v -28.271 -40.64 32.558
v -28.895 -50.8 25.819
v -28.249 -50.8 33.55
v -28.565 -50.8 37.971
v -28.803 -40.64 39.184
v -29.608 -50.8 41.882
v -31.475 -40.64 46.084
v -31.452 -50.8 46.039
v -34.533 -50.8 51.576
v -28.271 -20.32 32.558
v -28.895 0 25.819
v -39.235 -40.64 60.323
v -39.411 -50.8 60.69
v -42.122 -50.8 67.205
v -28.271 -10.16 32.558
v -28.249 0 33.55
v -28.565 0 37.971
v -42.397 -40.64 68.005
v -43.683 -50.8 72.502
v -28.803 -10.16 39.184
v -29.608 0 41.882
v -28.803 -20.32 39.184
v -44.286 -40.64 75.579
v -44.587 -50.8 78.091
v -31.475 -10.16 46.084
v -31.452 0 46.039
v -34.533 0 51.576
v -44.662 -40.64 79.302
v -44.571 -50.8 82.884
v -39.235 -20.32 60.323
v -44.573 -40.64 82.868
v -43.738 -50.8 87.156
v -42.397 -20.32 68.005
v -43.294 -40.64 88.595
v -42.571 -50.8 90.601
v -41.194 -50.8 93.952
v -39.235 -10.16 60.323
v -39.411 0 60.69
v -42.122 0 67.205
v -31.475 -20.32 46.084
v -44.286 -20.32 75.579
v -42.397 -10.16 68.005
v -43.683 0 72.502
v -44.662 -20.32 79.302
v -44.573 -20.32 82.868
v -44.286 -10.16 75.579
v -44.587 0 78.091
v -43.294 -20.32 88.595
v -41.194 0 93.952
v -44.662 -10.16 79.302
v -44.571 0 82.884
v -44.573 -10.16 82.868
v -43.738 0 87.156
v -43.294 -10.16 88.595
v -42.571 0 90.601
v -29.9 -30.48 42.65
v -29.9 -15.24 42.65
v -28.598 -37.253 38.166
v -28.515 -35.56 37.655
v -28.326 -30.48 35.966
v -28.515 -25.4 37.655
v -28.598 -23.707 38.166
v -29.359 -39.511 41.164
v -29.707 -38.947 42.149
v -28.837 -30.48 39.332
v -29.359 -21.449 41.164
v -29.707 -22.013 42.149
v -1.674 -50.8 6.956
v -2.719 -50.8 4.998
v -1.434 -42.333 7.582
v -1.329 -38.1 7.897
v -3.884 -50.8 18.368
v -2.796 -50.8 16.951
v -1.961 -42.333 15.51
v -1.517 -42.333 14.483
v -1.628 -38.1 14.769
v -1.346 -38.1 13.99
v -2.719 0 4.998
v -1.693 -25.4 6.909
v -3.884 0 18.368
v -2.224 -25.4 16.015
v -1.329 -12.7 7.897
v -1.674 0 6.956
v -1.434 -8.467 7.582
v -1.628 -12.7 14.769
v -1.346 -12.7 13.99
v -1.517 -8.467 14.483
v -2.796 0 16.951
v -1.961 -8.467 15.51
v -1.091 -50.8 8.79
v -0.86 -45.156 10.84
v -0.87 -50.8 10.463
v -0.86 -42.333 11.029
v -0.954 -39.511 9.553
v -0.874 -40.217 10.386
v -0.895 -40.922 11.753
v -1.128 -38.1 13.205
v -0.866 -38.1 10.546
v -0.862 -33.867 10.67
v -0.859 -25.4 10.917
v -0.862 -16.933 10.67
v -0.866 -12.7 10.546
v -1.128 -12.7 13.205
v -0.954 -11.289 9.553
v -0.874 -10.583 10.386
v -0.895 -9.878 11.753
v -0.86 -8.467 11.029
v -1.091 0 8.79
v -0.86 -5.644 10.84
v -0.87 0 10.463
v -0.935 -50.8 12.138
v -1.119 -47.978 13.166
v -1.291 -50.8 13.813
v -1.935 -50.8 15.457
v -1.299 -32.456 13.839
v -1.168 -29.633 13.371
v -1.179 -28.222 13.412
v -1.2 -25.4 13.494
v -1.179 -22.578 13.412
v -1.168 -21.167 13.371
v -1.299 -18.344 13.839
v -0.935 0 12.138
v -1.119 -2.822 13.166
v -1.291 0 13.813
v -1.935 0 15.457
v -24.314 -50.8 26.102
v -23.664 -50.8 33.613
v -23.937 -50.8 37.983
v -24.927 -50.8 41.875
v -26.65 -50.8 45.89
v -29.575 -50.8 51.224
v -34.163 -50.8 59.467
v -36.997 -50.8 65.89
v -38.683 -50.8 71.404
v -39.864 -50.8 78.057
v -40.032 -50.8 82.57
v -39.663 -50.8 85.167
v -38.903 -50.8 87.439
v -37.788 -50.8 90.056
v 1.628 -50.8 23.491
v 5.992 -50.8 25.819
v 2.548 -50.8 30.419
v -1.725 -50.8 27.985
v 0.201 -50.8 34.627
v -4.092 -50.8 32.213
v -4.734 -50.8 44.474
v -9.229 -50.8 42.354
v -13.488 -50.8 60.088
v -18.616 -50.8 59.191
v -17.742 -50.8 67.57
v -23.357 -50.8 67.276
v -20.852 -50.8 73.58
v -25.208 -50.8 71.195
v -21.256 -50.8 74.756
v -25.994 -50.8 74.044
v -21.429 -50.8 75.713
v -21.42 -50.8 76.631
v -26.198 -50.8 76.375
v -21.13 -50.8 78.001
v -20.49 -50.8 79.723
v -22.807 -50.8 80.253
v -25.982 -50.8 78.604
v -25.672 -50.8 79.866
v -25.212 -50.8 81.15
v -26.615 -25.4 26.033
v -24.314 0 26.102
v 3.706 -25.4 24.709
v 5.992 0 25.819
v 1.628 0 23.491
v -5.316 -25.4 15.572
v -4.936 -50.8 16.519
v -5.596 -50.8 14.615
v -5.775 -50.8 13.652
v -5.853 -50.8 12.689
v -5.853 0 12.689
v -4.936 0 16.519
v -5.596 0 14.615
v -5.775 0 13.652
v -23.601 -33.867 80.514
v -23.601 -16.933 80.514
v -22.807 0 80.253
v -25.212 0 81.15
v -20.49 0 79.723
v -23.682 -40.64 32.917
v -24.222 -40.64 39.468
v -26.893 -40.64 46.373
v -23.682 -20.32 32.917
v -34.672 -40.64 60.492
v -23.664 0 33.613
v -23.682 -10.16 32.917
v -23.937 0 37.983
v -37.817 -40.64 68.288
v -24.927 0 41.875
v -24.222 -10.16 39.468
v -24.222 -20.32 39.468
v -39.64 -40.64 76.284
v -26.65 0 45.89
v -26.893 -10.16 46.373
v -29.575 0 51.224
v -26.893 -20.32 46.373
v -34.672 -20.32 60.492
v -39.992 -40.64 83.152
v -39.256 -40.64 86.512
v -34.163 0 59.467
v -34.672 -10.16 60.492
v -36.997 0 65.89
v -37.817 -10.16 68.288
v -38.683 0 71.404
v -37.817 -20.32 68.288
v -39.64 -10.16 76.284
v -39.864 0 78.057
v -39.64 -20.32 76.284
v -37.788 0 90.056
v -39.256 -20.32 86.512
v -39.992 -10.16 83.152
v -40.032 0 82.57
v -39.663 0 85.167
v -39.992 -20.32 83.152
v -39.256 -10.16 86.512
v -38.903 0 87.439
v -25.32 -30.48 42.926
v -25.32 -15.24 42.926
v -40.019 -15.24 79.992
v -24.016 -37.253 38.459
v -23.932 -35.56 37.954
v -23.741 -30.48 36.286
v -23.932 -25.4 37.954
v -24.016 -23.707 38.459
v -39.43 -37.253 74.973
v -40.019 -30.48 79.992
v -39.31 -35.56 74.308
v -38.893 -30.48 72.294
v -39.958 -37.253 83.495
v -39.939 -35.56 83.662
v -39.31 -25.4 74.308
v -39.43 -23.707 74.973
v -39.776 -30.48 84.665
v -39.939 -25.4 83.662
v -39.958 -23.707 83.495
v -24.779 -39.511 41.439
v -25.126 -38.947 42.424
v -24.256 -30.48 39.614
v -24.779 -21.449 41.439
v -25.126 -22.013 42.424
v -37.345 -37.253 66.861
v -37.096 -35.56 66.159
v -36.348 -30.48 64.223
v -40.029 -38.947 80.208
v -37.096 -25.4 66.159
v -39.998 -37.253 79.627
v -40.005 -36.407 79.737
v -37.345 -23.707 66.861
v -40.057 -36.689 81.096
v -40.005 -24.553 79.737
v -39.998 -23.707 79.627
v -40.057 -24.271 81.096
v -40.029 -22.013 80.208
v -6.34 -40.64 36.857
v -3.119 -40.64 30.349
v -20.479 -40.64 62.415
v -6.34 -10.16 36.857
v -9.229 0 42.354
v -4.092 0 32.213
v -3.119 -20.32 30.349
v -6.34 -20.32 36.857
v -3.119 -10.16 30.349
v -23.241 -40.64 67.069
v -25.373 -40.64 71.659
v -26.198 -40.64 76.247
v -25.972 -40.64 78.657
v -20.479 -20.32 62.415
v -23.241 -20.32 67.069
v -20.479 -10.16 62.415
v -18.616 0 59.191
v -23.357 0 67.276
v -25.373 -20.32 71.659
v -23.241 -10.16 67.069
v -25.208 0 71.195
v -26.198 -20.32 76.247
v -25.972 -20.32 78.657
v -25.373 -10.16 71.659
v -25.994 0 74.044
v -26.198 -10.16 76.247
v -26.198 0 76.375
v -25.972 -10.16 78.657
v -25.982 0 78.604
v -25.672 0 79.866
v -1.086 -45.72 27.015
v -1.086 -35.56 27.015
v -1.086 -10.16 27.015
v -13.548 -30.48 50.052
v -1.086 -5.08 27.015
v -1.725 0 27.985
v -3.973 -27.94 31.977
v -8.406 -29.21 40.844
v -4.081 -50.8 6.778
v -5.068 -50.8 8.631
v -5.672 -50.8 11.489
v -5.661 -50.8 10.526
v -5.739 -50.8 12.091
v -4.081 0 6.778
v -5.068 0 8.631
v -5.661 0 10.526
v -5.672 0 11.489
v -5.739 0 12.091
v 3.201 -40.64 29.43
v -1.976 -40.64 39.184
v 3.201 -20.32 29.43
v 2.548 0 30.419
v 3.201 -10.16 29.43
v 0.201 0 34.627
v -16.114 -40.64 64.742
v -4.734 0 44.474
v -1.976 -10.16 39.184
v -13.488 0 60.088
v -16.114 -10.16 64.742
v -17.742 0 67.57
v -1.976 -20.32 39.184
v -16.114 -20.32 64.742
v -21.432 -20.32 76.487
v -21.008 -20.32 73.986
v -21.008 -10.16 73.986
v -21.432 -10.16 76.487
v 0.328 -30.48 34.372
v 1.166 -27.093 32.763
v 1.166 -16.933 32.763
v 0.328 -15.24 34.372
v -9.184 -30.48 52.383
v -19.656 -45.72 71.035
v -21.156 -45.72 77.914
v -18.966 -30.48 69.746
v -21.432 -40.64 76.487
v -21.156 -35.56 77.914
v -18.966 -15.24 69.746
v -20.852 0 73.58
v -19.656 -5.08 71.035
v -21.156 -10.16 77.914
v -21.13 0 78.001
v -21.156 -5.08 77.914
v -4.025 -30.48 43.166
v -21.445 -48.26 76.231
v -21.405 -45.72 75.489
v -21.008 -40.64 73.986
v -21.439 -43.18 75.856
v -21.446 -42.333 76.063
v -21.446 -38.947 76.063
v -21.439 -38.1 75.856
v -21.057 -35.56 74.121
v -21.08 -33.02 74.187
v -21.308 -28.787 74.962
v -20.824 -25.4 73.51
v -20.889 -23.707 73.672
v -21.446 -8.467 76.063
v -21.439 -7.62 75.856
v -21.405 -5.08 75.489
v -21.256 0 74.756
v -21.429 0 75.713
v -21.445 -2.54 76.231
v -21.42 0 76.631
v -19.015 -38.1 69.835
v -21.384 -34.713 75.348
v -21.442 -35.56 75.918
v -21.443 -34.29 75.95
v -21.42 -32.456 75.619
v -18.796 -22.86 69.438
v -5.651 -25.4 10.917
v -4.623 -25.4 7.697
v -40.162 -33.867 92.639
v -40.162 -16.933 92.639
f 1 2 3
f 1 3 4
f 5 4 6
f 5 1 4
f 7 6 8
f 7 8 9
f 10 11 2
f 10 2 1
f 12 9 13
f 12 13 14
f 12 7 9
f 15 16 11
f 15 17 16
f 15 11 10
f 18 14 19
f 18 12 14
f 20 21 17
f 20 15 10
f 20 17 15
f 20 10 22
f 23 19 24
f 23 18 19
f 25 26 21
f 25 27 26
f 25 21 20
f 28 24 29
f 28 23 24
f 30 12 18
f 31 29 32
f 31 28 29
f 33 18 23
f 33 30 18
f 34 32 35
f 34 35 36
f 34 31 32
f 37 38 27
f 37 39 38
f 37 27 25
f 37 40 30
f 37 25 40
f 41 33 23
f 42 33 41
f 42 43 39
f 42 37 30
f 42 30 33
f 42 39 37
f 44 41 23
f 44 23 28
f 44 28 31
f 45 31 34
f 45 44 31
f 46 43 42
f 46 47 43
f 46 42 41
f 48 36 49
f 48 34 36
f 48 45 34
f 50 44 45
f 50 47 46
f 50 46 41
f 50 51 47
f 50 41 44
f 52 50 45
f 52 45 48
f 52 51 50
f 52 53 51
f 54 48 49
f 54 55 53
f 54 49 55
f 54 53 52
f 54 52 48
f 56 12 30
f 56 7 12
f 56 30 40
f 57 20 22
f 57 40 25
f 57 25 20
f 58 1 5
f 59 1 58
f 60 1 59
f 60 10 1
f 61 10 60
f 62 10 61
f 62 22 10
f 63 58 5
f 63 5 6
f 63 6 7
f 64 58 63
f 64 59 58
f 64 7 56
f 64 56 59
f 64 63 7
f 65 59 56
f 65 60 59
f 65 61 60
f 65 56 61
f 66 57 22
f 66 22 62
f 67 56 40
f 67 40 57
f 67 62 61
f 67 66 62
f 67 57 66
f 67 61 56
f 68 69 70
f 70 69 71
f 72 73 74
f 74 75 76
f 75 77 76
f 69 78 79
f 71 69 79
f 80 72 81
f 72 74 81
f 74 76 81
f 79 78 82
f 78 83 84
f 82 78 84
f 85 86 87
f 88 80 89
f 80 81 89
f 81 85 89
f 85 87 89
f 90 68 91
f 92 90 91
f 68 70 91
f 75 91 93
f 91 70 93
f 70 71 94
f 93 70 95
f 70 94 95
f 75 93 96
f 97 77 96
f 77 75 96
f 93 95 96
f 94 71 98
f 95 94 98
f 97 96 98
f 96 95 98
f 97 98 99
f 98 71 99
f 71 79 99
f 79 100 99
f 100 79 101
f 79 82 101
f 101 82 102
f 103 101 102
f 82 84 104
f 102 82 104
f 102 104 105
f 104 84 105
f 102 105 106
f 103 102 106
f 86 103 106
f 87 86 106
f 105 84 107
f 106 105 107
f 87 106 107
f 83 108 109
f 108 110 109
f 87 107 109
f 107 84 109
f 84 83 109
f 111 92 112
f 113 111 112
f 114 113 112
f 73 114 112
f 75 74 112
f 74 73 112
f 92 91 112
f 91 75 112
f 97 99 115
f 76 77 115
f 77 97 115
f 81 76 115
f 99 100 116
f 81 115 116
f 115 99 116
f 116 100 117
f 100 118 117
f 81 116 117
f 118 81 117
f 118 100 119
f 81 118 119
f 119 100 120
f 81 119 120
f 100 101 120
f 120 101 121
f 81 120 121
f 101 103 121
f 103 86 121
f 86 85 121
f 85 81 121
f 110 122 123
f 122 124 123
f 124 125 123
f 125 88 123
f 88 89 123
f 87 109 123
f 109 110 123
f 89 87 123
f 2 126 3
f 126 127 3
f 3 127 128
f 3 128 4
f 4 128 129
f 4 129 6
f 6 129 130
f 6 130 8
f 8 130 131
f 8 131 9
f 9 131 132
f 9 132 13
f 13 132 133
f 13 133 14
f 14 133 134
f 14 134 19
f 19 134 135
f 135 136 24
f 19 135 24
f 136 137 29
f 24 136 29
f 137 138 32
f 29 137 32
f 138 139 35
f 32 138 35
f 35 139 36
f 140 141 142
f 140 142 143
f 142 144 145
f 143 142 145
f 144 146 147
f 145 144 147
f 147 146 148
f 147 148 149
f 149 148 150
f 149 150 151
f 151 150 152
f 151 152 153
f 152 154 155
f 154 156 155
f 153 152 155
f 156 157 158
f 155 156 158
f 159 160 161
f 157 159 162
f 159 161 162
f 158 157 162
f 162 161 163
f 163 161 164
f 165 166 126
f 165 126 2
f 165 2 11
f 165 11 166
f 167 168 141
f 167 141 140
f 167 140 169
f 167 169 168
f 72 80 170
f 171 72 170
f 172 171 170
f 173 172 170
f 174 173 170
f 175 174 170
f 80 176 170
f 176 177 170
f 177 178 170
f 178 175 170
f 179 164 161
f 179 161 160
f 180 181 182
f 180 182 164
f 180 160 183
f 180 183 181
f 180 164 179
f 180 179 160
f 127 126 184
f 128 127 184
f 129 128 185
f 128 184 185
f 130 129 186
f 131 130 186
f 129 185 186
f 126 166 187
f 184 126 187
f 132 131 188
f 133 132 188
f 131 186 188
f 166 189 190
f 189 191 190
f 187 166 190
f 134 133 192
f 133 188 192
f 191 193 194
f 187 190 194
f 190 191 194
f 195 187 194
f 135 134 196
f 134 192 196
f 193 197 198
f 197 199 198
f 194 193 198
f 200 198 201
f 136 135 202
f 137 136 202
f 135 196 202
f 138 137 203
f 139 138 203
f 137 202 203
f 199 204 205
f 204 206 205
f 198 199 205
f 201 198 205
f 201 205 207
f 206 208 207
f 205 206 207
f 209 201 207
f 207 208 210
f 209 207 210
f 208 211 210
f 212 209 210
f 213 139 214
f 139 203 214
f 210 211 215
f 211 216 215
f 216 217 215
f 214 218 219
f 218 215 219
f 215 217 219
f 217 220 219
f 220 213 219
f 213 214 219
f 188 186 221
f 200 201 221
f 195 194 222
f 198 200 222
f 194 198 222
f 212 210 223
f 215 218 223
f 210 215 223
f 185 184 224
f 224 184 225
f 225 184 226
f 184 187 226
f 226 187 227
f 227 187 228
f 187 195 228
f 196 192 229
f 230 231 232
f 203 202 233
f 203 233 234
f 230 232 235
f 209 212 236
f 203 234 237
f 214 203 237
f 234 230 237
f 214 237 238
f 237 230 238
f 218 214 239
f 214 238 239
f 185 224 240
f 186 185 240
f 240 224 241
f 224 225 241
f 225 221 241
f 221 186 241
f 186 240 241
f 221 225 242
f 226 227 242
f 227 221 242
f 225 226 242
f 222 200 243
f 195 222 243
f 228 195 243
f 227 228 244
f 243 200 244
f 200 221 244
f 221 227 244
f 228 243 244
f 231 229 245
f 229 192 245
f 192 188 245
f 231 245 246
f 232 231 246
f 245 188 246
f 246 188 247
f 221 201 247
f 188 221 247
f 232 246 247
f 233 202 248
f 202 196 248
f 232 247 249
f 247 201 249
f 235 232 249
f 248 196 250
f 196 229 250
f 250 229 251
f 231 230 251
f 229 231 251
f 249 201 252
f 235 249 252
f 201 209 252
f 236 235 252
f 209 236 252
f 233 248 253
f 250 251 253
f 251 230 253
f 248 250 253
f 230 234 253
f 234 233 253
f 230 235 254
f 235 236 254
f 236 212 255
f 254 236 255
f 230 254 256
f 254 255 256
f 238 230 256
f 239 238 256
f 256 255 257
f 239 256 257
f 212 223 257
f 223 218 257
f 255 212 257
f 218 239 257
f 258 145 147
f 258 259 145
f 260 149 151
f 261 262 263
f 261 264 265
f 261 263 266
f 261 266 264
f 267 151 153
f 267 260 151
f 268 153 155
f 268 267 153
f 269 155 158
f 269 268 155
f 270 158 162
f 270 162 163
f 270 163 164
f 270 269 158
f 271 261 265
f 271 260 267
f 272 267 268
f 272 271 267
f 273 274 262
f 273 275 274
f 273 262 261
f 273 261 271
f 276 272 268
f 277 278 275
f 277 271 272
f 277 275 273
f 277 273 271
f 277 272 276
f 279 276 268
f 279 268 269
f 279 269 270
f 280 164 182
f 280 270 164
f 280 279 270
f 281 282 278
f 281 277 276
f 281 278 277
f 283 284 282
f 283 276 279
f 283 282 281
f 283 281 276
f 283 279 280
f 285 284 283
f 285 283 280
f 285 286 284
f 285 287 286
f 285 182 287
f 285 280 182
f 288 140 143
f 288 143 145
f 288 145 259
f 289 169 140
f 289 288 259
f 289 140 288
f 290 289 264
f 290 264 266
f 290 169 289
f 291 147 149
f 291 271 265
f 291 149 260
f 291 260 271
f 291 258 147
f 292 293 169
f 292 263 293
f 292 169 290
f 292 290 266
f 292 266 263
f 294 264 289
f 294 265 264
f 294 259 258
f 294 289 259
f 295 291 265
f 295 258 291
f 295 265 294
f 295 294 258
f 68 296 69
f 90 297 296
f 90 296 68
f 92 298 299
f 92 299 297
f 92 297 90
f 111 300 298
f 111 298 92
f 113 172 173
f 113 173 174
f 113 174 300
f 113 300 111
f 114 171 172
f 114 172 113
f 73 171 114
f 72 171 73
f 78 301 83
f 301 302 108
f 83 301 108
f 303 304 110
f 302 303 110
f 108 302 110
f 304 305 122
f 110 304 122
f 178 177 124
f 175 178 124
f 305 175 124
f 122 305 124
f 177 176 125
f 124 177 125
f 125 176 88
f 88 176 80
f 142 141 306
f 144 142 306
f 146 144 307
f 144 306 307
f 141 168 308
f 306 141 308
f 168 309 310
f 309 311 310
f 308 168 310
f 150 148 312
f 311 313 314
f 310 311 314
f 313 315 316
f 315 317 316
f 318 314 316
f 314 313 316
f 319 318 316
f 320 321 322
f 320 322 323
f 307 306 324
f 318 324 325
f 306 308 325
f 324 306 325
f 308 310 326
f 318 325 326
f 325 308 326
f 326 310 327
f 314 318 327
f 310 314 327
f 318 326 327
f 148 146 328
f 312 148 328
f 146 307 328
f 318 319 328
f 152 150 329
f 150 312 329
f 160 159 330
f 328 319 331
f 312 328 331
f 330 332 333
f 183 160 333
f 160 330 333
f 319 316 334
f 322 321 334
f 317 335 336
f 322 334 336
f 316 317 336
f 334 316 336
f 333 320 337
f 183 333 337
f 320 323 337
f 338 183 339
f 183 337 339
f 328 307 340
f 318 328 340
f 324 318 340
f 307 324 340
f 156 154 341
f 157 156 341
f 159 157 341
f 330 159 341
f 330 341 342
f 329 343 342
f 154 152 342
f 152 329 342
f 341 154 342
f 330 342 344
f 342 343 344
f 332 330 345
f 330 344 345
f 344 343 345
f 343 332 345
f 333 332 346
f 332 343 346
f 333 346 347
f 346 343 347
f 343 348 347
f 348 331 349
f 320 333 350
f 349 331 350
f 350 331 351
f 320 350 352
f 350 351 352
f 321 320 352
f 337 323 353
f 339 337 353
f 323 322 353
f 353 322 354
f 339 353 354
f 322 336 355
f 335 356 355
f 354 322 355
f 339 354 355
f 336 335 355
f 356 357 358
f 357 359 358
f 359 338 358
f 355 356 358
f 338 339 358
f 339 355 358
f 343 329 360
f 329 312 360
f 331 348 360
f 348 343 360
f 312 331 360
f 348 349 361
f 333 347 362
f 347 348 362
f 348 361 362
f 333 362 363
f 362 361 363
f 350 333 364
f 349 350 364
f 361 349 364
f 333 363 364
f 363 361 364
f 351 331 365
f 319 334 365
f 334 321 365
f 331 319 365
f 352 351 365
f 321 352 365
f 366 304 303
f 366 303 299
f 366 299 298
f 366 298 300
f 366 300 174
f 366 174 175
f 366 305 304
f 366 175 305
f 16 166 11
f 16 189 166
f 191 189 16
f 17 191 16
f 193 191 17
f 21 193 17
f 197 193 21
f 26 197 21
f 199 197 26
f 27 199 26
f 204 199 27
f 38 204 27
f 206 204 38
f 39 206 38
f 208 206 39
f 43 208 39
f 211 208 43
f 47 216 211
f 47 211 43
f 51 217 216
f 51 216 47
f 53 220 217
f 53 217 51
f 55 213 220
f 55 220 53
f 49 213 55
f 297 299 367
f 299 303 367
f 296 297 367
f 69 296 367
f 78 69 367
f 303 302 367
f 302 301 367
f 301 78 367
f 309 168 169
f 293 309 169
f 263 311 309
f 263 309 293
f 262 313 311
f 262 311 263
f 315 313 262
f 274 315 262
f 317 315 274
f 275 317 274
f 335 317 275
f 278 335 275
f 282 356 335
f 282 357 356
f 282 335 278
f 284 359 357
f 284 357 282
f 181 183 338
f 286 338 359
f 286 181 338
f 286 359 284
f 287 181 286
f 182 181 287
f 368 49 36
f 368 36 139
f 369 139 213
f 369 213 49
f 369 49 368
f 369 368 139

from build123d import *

# Parameters (mm, degrees)
F1_DEPTH = 50.8


# Not quite as in the source:
# - a feature names something its author has since deleted; it is built from what else it names


with BuildPart() as f1:
    # F0 (on Front) → F1 (new body)
    with BuildSketch(Plane.XZ):
        with BuildLine():
            add(Edge.make_bspline(
                [(-24.3141159331, 26.1021399349), (-26.6260970552, 26.1057942616), (-28.8948994559, 25.8185440872)],
                knots=[1.5683489444, 1.5683489444, 1.5683489444, 1.7643806816, 1.7643806816, 1.7643806816], degree=2, weights=[1, 0.9952002892, 1]))
            add(Edge.make_bspline(
                [(-24.3141159331, 26.1021399349), (-23.7504685709, 30.7816022131), (-22.6573335885, 39.7966807836), (-31.0371752335, 53.456246822), (-38.5489160591, 67.3127661846), (-40.9073074567, 83.4789578935), (-38.987254402, 87.2492337999), (-37.7880842583, 90.0557118677)],
                knots=[0, 0, 0, 0, 0.2002565357, 0.4141172276, 0.6374458564, 0.8497473054, 0.9956221455, 0.9956221455, 0.9956221455, 0.9956221455], degree=3))
            add(Edge.make_bspline(
                [(-41.1941618229, 93.9520463131), (-40.2207372717, 92.6374220537), (-39.0620502408, 91.3242148197), (-37.7880842583, 90.0557118677)],
                knots=[0.1145347036, 0.1145347036, 0.1145347036, 0.1145347036, 0.1557606283, 0.1557606283, 0.1557606283, 0.1557606283], degree=3))
            add(Edge.make_bspline(
                [(-28.8948994559, 25.8185440872), (-28.3516476874, 30.3286799071), (-27.2234114209, 39.6269273648), (-35.638432395, 53.0342333907), (-43.0621524761, 67.4698179733), (-45.8697930663, 82.837401957), (-42.6908916889, 90.4240239555), (-41.1941618229, 93.9520463131)],
                knots=[0, 0, 0, 0, 0.193010248, 0.3991323855, 0.6143798623, 0.8189991781, 0.997394633, 0.997394633, 0.997394633, 0.997394633], degree=3))
        make_face()
    extrude(amount=F1_DEPTH)


with BuildPart() as f1b:
    # F0 (on Front) → F1, piece 2 (new body)
    with BuildSketch(Plane.XZ):
        with BuildLine():
            add(Edge.make_bspline(
                [(-0.8593497944, 10.9171546791), (-0.8593497944, 14.8987735909), (-3.884425209, 18.3681205211)],
                knots=[0, 0, 0, 0.5128680966, 0.5128680966, 0.5128680966], degree=2, weights=[1, 0.9673005687, 1]))
            add(Edge.make_bspline(
                [(-3.884425209, 18.3681205211), (-5.7694255428, 15.6159078961), (-5.8530664589, 12.6887294195)],
                knots=[2.7937773438, 2.7937773438, 2.7937773438, 3.1264681713, 3.1264681713, 3.1264681713], degree=2, weights=[1, 0.9861964753, 1]))
            add(Edge.make_bspline(
                [(-5.6510078625, 10.9171546791), (-5.6510078625, 11.8077482948), (-5.8530664589, 12.6887294195)],
                knots=[0, 0, 0, 0.147056621, 0.147056621, 0.147056621], degree=2, weights=[1, 0.9972980114, 1]))
            add(Edge.make_bspline(
                [(-5.6608244172, 10.5256666684), (-5.6510078625, 10.7213593391), (-5.6510078625, 10.9171546791)],
                knots=[6.2507996255, 6.2507996255, 6.2507996255, 6.2831853072, 6.2831853072, 6.2831853072], degree=2, weights=[1, 0.9998688988, 1]))
            add(Edge.make_bspline(
                [(-5.6608244172, 10.5256666684), (-5.0617599039, 7.6318214617), (-2.7192334462, 4.9979547786)],
                knots=[3.2507399401, 3.2507399401, 3.2507399401, 3.5816071025, 3.5816071025, 3.5816071025], degree=2, weights=[1, 0.9863470459, 1]))
            add(Edge.make_bspline(
                [(-2.7192334462, 4.9979547786), (-0.8593497944, 7.8356784138), (-0.8593497944, 10.9171546791)],
                knots=[5.8827655458, 5.8827655458, 5.8827655458, 6.2831853072, 6.2831853072, 6.2831853072], degree=2, weights=[1, 0.9800248594, 1]))
        make_face()
    extrude(amount=F1_DEPTH)


with BuildPart() as f1c:
    # F0 (on Front) → F1, piece 3 (new body)
    with BuildSketch(Plane.XZ):
        with BuildLine():
            add(Edge.make_bspline(
                [(1.6275324331, 23.4913965441), (-2.5781939039, 28.3605122499), (-5.7531419947, 36.5388547463), (-13.843696099, 50.3742483725), (-20.181170777, 62.2846491187), (-26.1336358697, 71.3016463879), (-26.6173623264, 77.7683902544), (-25.2118867969, 81.1500811666)],
                knots=[0, 0, 0, 0, 0.2201847678, 0.4398977895, 0.6466164756, 0.82714544, 0.9983698701, 0.9983698701, 0.9983698701, 0.9983698701], degree=3))
            add(Edge.make_bspline(
                [(5.9918386386, 25.8185440664), (3.6020725269, 24.7640726232), (1.6275324331, 23.4913965441)],
                knots=[2.2656666605, 2.2656666605, 2.2656666605, 2.4540091157, 2.4540091157, 2.4540091157], degree=2, weights=[1, 0.9955691659, 1]))
            add(Edge.make_bspline(
                [(5.9918386386, 25.8185440664), (1.6159325214, 30.8846828247), (-1.3008960748, 38.7397948712), (-9.5296098113, 52.8425702091), (-15.7126231247, 64.2182177816), (-21.6591543897, 74.1423833807), (-21.6600143389, 76.9665087767), (-20.4903893837, 79.7229993409)],
                knots=[0, 0, 0, 0, 0.229094286, 0.4576977372, 0.6727810523, 0.8606149094, 1, 1, 1, 1], degree=3))
            add(Edge.make_bspline(
                [(-25.2118867969, 81.1500811666), (-23.5876635098, 80.4401666232), (-21.9982141694, 79.9443299939), (-20.4903893837, 79.7229993409)],
                knots=[0.2764650159, 0.2764650159, 0.2764650159, 0.2764650159, 0.3225195587, 0.3225195587, 0.3225195587, 0.3225195587], degree=3))
        make_face()
    extrude(amount=F1_DEPTH)


solid = Compound([f1.part, f1b.part, f1c.part])
